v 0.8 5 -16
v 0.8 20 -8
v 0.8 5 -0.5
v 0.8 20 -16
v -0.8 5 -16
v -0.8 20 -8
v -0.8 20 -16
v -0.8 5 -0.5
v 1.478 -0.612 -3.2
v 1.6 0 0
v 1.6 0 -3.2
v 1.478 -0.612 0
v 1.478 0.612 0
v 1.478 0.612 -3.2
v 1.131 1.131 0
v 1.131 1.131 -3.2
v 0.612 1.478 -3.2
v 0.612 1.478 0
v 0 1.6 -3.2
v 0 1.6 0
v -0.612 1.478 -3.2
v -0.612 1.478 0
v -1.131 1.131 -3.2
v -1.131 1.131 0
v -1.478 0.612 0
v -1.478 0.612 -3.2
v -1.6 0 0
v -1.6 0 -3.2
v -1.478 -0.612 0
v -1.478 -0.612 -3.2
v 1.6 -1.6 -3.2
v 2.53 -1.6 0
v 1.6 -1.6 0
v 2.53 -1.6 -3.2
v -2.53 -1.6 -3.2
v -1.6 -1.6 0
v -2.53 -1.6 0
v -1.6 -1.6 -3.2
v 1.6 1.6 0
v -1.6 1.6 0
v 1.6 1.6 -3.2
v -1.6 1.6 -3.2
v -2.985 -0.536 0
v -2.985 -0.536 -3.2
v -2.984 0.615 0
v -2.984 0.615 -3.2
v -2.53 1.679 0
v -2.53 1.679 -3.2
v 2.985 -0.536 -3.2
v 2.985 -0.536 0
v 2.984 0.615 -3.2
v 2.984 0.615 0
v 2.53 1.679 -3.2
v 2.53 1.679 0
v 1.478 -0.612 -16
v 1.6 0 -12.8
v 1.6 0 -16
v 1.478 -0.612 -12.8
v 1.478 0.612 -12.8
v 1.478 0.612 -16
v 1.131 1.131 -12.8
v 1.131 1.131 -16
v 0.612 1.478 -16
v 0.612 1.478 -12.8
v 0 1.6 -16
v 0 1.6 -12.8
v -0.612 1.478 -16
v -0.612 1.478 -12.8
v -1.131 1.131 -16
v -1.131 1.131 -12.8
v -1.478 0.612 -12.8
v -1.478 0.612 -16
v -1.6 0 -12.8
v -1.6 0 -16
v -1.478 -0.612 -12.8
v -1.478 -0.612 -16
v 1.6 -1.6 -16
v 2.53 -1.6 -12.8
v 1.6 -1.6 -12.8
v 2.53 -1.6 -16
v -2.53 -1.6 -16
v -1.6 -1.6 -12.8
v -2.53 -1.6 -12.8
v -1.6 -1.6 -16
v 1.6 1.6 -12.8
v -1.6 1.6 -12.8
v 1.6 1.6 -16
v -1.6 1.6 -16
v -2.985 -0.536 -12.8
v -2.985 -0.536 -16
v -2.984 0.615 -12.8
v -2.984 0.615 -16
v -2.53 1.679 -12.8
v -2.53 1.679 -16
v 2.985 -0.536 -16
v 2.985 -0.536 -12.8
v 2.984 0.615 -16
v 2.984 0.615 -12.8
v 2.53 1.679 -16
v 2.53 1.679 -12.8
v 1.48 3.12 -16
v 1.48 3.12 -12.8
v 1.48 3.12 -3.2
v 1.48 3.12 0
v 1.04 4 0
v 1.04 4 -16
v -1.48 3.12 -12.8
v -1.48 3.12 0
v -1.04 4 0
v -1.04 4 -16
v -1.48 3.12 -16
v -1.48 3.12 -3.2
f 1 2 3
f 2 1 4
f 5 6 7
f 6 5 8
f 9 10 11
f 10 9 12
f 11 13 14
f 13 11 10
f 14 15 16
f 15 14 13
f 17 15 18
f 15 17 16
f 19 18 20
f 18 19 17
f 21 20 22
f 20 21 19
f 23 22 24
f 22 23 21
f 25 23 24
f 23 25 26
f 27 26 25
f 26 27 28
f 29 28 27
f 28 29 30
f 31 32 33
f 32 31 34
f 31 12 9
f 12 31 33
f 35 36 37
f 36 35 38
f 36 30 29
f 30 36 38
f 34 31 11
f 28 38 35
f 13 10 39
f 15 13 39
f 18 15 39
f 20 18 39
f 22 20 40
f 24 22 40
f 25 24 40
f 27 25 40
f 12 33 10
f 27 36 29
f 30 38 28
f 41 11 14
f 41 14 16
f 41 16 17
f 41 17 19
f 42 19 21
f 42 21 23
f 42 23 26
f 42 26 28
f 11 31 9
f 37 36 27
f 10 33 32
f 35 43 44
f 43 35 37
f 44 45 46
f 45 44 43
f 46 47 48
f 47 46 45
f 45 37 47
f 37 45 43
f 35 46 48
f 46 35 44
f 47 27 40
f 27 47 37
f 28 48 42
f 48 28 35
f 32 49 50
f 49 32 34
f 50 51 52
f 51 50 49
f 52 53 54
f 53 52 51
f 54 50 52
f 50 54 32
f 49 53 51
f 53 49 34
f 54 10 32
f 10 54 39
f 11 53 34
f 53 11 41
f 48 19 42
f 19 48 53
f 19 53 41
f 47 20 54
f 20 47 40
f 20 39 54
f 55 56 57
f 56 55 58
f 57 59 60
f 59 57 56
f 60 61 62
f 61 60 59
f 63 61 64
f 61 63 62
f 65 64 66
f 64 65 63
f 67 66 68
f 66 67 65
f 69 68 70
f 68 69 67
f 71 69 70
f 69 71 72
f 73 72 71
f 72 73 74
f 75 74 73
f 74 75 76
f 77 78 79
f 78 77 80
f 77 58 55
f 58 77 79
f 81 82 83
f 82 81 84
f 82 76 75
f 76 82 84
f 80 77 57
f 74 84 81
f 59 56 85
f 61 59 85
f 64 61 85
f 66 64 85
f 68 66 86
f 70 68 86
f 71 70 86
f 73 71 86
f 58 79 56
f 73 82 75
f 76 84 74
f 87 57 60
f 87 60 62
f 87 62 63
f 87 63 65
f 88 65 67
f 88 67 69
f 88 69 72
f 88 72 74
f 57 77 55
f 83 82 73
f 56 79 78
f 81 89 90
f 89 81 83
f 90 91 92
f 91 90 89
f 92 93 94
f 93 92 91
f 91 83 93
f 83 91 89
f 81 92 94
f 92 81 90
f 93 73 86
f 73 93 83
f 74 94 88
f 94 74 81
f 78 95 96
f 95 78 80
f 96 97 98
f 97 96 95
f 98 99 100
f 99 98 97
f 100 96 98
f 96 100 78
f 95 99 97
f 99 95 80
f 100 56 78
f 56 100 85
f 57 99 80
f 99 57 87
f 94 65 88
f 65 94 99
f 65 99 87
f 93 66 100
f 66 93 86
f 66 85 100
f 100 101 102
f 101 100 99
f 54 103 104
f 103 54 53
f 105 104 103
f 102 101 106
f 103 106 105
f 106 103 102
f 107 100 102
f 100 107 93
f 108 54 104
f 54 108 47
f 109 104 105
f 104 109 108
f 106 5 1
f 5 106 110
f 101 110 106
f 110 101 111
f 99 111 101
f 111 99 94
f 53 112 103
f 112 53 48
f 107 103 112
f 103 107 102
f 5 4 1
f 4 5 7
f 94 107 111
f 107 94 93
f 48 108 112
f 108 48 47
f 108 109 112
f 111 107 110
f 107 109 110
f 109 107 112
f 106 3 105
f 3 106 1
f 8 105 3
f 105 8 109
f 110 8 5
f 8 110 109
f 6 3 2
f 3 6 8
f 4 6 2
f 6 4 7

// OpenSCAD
// file: ../p/5-8edge.scad
use <../lib.scad>
function ldraw_lib__5_8edge() = [
// 0 Circle 0.625
// 0 Name: 5-8edge.dat
// 0 Author: Mark Kennedy [mkennedy]
// 0 !LDRAW_ORG Primitive UPDATE 2017-01
// 0 !LICENSE Licensed under CC BY 4.0 : see CAreadme.txt
// 
// 0 BFC CERTIFY CCW
  [0,"BFC","CERTIFY"],
  [0,"BFC","CCW"],
// 
// 0 !HISTORY 2004-04-22 [PTadmin] Official Update 2004-02
// 0 !HISTORY 2005-12-28 [PTadmin] Official Update 2005-01
// 0 !HISTORY 2007-06-24 [PTadmin] Header formatted for Contributor Agreement
// 0 !HISTORY 2008-07-01 [PTadmin] Official Update 2008-01
// 0 !HISTORY 2017-01-15 [Steffen] BFCed
// 0 !HISTORY 2017-12-30 [PTadmin] Official Update 2017-01
// 
// 
// 2 24 1 0 0 0.9239 0 0.3827
  [2,24,1,0,0,0.9239,0,0.3827],
// 2 24 0.9239 0 0.3827 0.7071 0 0.7071
  [2,24,0.9239,0,0.3827,0.7071,0,0.7071],
// 2 24 0.7071 0 0.7071 0.3827 0 0.9239
  [2,24,0.7071,0,0.7071,0.3827,0,0.9239],
// 2 24 0.3827 0 0.9239 0 0 1
  [2,24,0.3827,0,0.9239,0,0,1],
// 2 24 0 0 1 -0.3827 0 0.9239
  [2,24,0,0,1,-0.3827,0,0.9239],
// 2 24 -0.3827 0 0.9239 -0.7071 0 0.7071
  [2,24,-0.3827,0,0.9239,-0.7071,0,0.7071],
// 2 24 -0.7071 0 0.7071 -0.9239 0 0.3827
  [2,24,-0.7071,0,0.7071,-0.9239,0,0.3827],
// 2 24 -0.9239 0 0.3827 -1 0 0
  [2,24,-0.9239,0,0.3827,-1,0,0],
// 2 24 -1 0 0 -0.9239 0 -0.3827
  [2,24,-1,0,0,-0.9239,0,-0.3827],
// 2 24 -0.9239 0 -0.3827 -0.7071 0 -0.7071
  [2,24,-0.9239,0,-0.3827,-0.7071,0,-0.7071],
];
module ldraw_lib__5_8edge(step=0, col=false, unit=2/5, alt=false, line=0.2, solid=!$preview)
    makepoly(ldraw_lib__5_8edge(), step=step, col=col, unit=unit, alt=alt, line=line, solid=solid);
ldraw_lib__5_8edge(line=0.2);
// file: ../p/5-8cyli.scad
use <../lib.scad>
function ldraw_lib__5_8cyli() = [
// 0 Cylinder 0.625
// 0 Name: 5-8cyli.dat
// 0 Author: Mark Kennedy [mkennedy]
// 0 !LDRAW_ORG Primitive UPDATE 2005-01
// 0 !LICENSE Licensed under CC BY 4.0 : see CAreadme.txt
// 
// 0 BFC CERTIFY CCW
  [0,"BFC","CERTIFY"],
  [0,"BFC","CCW"],
// 
// 0 !HISTORY 2004-04-22 [PTadmin] Official Update 2004-02
// 0 !HISTORY 2004-12-11 [nielsk] Recreated using Primitive Generator, Edge lines fixed, BFC changed to CCW
// 0 !HISTORY 2005-12-28 [PTadmin] Official Update 2005-01
// 0 !HISTORY 2007-06-24 [PTadmin] Header formatted for Contributor Agreement
// 0 !HISTORY 2008-07-01 [PTadmin] Official Update 2008-01
// 
// 
// 4 16 .9239 1 .3827 .9239 0 .3827 1 0 0 1 1 0
  [4,16,.9239,1,.3827,.9239,0,.3827,1,0,0,1,1,0],
// 4 16 .7071 1 .7071 .7071 0 .7071 .9239 0 .3827 .9239 1 .3827
  [4,16,.7071,1,.7071,.7071,0,.7071,.9239,0,.3827,.9239,1,.3827],
// 4 16 .3827 1 .9239 .3827 0 .9239 .7071 0 .7071 .7071 1 .7071
  [4,16,.3827,1,.9239,.3827,0,.9239,.7071,0,.7071,.7071,1,.7071],
// 4 16 0 1 1 0 0 1 .3827 0 .9239 .3827 1 .9239
  [4,16,0,1,1,0,0,1,.3827,0,.9239,.3827,1,.9239],
// 4 16 -.3827 1 .9239 -.3827 0 .9239 0 0 1 0 1 1
  [4,16,-.3827,1,.9239,-.3827,0,.9239,0,0,1,0,1,1],
// 4 16 -.7071 1 .7071 -.7071 0 .7071 -.3827 0 .9239 -.3827 1 .9239
  [4,16,-.7071,1,.7071,-.7071,0,.7071,-.3827,0,.9239,-.3827,1,.9239],
// 4 16 -.9239 1 .3827 -.9239 0 .3827 -.7071 0 .7071 -.7071 1 .7071
  [4,16,-.9239,1,.3827,-.9239,0,.3827,-.7071,0,.7071,-.7071,1,.7071],
// 4 16 -1 1 0 -1 0 0 -.9239 0 .3827 -.9239 1 .3827
  [4,16,-1,1,0,-1,0,0,-.9239,0,.3827,-.9239,1,.3827],
// 4 16 -.9239 1 -.3827 -.9239 0 -.3827 -1 0 0 -1 1 0
  [4,16,-.9239,1,-.3827,-.9239,0,-.3827,-1,0,0,-1,1,0],
// 4 16 -.7071 1 -.7071 -.7071 0 -.7071 -.9239 0 -.3827 -.9239 1 -.3827
  [4,16,-.7071,1,-.7071,-.7071,0,-.7071,-.9239,0,-.3827,-.9239,1,-.3827],
// 0
// 5 24 1 1 0 1 0 0 1 1 -.4142 .9239 1 .3827
  [5,24,1,1,0,1,0,0,1,1,-.4142,.9239,1,.3827],
// 5 24 .9239 1 .3827 .9239 0 .3827 1 1 0 .7071 1 .7071
  [5,24,.9239,1,.3827,.9239,0,.3827,1,1,0,.7071,1,.7071],
// 5 24 .7071 1 .7071 .7071 0 .7071 .9239 1 .3827 .3827 1 .9239
  [5,24,.7071,1,.7071,.7071,0,.7071,.9239,1,.3827,.3827,1,.9239],
// 5 24 .3827 1 .9239 .3827 0 .9239 .7071 1 .7071 0 1 1
  [5,24,.3827,1,.9239,.3827,0,.9239,.7071,1,.7071,0,1,1],
// 5 24 0 1 1 0 0 1 .3827 1 .9239 -.3827 1 .9239
  [5,24,0,1,1,0,0,1,.3827,1,.9239,-.3827,1,.9239],
// 5 24 -.3827 1 .9239 -.3827 0 .9239 0 1 1 -.7071 1 .7071
  [5,24,-.3827,1,.9239,-.3827,0,.9239,0,1,1,-.7071,1,.7071],
// 5 24 -.7071 1 .7071 -.7071 0 .7071 -.3827 1 .9239 -.9239 1 .3827
  [5,24,-.7071,1,.7071,-.7071,0,.7071,-.3827,1,.9239,-.9239,1,.3827],
// 5 24 -.9239 1 .3827 -.9239 0 .3827 -.7071 1 .7071 -1 1 0
  [5,24,-.9239,1,.3827,-.9239,0,.3827,-.7071,1,.7071,-1,1,0],
// 5 24 -1 1 0 -1 0 0 -.9239 1 .3827 -.9239 1 -.3827
  [5,24,-1,1,0,-1,0,0,-.9239,1,.3827,-.9239,1,-.3827],
// 5 24 -.9239 1 -.3827 -.9239 0 -.3827 -1 1 0 -.7071 1 -.7071
  [5,24,-.9239,1,-.3827,-.9239,0,-.3827,-1,1,0,-.7071,1,-.7071],
// 5 24 -.7071 1 -.7071 -.7071 0 -.7071 -.9239 1 -.3827 -.4142 1 -1
  [5,24,-.7071,1,-.7071,-.7071,0,-.7071,-.9239,1,-.3827,-.4142,1,-1],
// 0
];
module ldraw_lib__5_8cyli(step=0, col=false, unit=2/5, alt=false, line=0.2, solid=!$preview)
    makepoly(ldraw_lib__5_8cyli(), step=step, col=col, unit=unit, alt=alt, line=line, solid=solid);
ldraw_lib__5_8cyli(line=0.2);
// file: ../p/3-16edge.scad
use <../lib.scad>
function ldraw_lib__3_16edge() = [
// 0 Circle 0.1875
// 0 Name: 3-16edge.dat
// 0 Author: Donald Sutter [technog]
// 0 !LDRAW_ORG Primitive UPDATE 2017-01
// 0 !LICENSE Licensed under CC BY 4.0 : see CAreadme.txt
// 
// 0 BFC CERTIFY CCW
  [0,"BFC","CERTIFY"],
  [0,"BFC","CCW"],
// 
// 0 !HISTORY 2004-03-02 [PTadmin] Official Update 2004-01
// 0 !HISTORY 2007-06-24 [PTadmin] Header formatted for Contributor Agreement
// 0 !HISTORY 2008-07-01 [PTadmin] Official Update 2008-01
// 0 !HISTORY 2017-01-15 [Steffen] BFCed
// 0 !HISTORY 2017-12-30 [PTadmin] Official Update 2017-01
// 
// 
// 2 24 1 0 0 0.9239 0 0.3827
  [2,24,1,0,0,0.9239,0,0.3827],
// 2 24 0.9239 0 0.3827 0.7071 0 0.7071
  [2,24,0.9239,0,0.3827,0.7071,0,0.7071],
// 2 24 0.7071 0 0.7071 0.3827 0 0.9239
  [2,24,0.7071,0,0.7071,0.3827,0,0.9239],
];
module ldraw_lib__3_16edge(step=0, col=false, unit=2/5, alt=false, line=0.2, solid=!$preview)
    makepoly(ldraw_lib__3_16edge(), step=step, col=col, unit=unit, alt=alt, line=line, solid=solid);
ldraw_lib__3_16edge(line=0.2);
// file: ../p/3-16cyli.scad
use <../lib.scad>
function ldraw_lib__3_16cyli() = [
// 0 Cylinder 0.1875
// 0 Name: 3-16cyli.dat
// 0 Author: Mark Kennedy [mkennedy]
// 0 !LDRAW_ORG Primitive UPDATE 2005-01
// 0 !LICENSE Licensed under CC BY 4.0 : see CAreadme.txt
// 
// 0 BFC CERTIFY CCW
  [0,"BFC","CERTIFY"],
  [0,"BFC","CCW"],
// 
// 0 !HISTORY 2004-03-02 [PTadmin] Official Update 2004-01
// 0 !HISTORY 2004-12-11 [nielsk] Recreated using Primitive Generator, Edge lines fixed, BFC changed to CCW
// 0 !HISTORY 2005-12-28 [PTadmin] Official Update 2005-01
// 0 !HISTORY 2007-06-24 [PTadmin] Header formatted for Contributor Agreement
// 0 !HISTORY 2008-07-01 [PTadmin] Official Update 2008-01
// 
// 
// 4 16 .9239 1 .3827 .9239 0 .3827 1 0 0 1 1 0
  [4,16,.9239,1,.3827,.9239,0,.3827,1,0,0,1,1,0],
// 4 16 .7071 1 .7071 .7071 0 .7071 .9239 0 .3827 .9239 1 .3827
  [4,16,.7071,1,.7071,.7071,0,.7071,.9239,0,.3827,.9239,1,.3827],
// 4 16 .3827 1 .9239 .3827 0 .9239 .7071 0 .7071 .7071 1 .7071
  [4,16,.3827,1,.9239,.3827,0,.9239,.7071,0,.7071,.7071,1,.7071],
// 5 24 1 1 0 1 0 0 1 1 -.4142 .9239 1 .3827
  [5,24,1,1,0,1,0,0,1,1,-.4142,.9239,1,.3827],
// 5 24 .9239 1 .3827 .9239 0 .3827 1 1 0 .7071 1 .7071
  [5,24,.9239,1,.3827,.9239,0,.3827,1,1,0,.7071,1,.7071],
// 5 24 .7071 1 .7071 .7071 0 .7071 .9239 1 .3827 .3827 1 .9239
  [5,24,.7071,1,.7071,.7071,0,.7071,.9239,1,.3827,.3827,1,.9239],
// 5 24 .3827 1 .9239 .3827 0 .9239 .7071 1 .7071 0 1 1.0824
  [5,24,.3827,1,.9239,.3827,0,.9239,.7071,1,.7071,0,1,1.0824],
// 0
];
module ldraw_lib__3_16cyli(step=0, col=false, unit=2/5, alt=false, line=0.2, solid=!$preview)
    makepoly(ldraw_lib__3_16cyli(), step=step, col=col, unit=unit, alt=alt, line=line, solid=solid);
ldraw_lib__3_16cyli(line=0.2);
// file: ../p/box2-5.scad
use <../lib.scad>
function ldraw_lib__box2_5() = [
// 0 Box with 2 Faces without 5 Edges
// 0 Name: box2-5.dat
// 0 Author: Steffen [Steffen]
// 0 !LDRAW_ORG Primitive UPDATE 2003-03
// 0 !LICENSE Licensed under CC BY 4.0 : see CAreadme.txt
// 
// 0 BFC CERTIFY CCW
  [0,"BFC","CERTIFY"],
  [0,"BFC","CCW"],
// 
// 0 !HISTORY 2003-12-19 [PTadmin] Official Update 2003-03
// 0 !HISTORY 2007-06-24 [PTadmin] Header formatted for Contributor Agreement
// 0 !HISTORY 2008-07-01 [PTadmin] Official Update 2008-01
// 
// 
// 2 24 1 1 1 -1 1 1
  [2,24,1,1,1,-1,1,1],
// 2 24 1 1 -1 -1 1 -1
  [2,24,1,1,-1,-1,1,-1],
// 2 24 1 -1 1 -1 -1 1
  [2,24,1,-1,1,-1,-1,1],
// 2 24 -1 -1 1 -1 1 1
  [2,24,-1,-1,1,-1,1,1],
// 2 24 1 -1 1 1 1 1
  [2,24,1,-1,1,1,1,1],
// 2 24 -1 1 -1 -1 1 1
  [2,24,-1,1,-1,-1,1,1],
// 2 24 1 1 -1 1 1 1
  [2,24,1,1,-1,1,1,1],
// 4 16 1 1 1 1 1 -1 -1 1 -1 -1 1 1
  [4,16,1,1,1,1,1,-1,-1,1,-1,-1,1,1],
// 4 16 1 1 1 -1 1 1 -1 -1 1 1 -1 1
  [4,16,1,1,1,-1,1,1,-1,-1,1,1,-1,1],
// 0
];
module ldraw_lib__box2_5(step=0, col=false, unit=2/5, alt=false, line=0.2, solid=!$preview)
    makepoly(ldraw_lib__box2_5(), step=step, col=col, unit=unit, alt=alt, line=line, solid=solid);
ldraw_lib__box2_5(line=0.2);
// file: ../p/5-8cylo.scad
use <../lib.scad>
use <5-8cyli.scad>
use <5-8edge.scad>
function ldraw_lib__5_8cylo() = [
// 0 Cylinder Open 0.625
// 0 Name: 5-8cylo.dat
// 0 Author: J.C. Tchang [tchang]
// 0 !LDRAW_ORG Primitive UPDATE 2013-01
// 0 !LICENSE Licensed under CC BY 4.0 : see CAreadme.txt
// 
// 0 BFC CERTIFY CCW
  [0,"BFC","CERTIFY"],
  [0,"BFC","CCW"],
// 
// 0 !HISTORY 2013-07-21 [PTadmin] Official Update 2013-01
// 
// 
// 1 16 0 0 0 1 0 0 0 1 0 0 0 1 5-8edge.dat
  [1,16,0,0,0,1,0,0,0,1,0,0,0,1, ldraw_lib__5_8edge()],
// 1 16 0 1 0 1 0 0 0 1 0 0 0 1 5-8edge.dat
  [1,16,0,1,0,1,0,0,0,1,0,0,0,1, ldraw_lib__5_8edge()],
// 1 16 0 0 0 1 0 0 0 1 0 0 0 1 5-8cyli.dat
  [1,16,0,0,0,1,0,0,0,1,0,0,0,1, ldraw_lib__5_8cyli()],
];
module ldraw_lib__5_8cylo(step=0, col=false, unit=2/5, alt=false, line=0.2, solid=!$preview)
    makepoly(ldraw_lib__5_8cylo(), step=step, col=col, unit=unit, alt=alt, line=line, solid=solid);
ldraw_lib__5_8cylo(line=0.2);
// file: ../p/3-16cylo.scad
use <../lib.scad>
use <3-16cyli.scad>
use <3-16edge.scad>
function ldraw_lib__3_16cylo() = [
// 0 Cylinder Open 0.1875
// 0 Name: 3-16cylo.dat
// 0 Author: J.C. Tchang [tchang]
// 0 !LDRAW_ORG Primitive UPDATE 2013-01
// 0 !LICENSE Licensed under CC BY 4.0 : see CAreadme.txt
// 
// 0 BFC CERTIFY CCW
  [0,"BFC","CERTIFY"],
  [0,"BFC","CCW"],
// 
// 0 !HISTORY 2013-07-21 [PTadmin] Official Update 2013-01
// 
// 
// 1 16 0 0 0 1 0 0 0 1 0 0 0 1 3-16edge.dat
  [1,16,0,0,0,1,0,0,0,1,0,0,0,1, ldraw_lib__3_16edge()],
// 1 16 0 1 0 1 0 0 0 1 0 0 0 1 3-16edge.dat
  [1,16,0,1,0,1,0,0,0,1,0,0,0,1, ldraw_lib__3_16edge()],
// 1 16 0 0 0 1 0 0 0 1 0 0 0 1 3-16cyli.dat
  [1,16,0,0,0,1,0,0,0,1,0,0,0,1, ldraw_lib__3_16cyli()],
];
module ldraw_lib__3_16cylo(step=0, col=false, unit=2/5, alt=false, line=0.2, solid=!$preview)
    makepoly(ldraw_lib__3_16cylo(), step=step, col=col, unit=unit, alt=alt, line=line, solid=solid);
ldraw_lib__3_16cylo(line=0.2);
// file: ../p/3-16chrd.scad
use <../lib.scad>
function ldraw_lib__3_16chrd() = [
// 0 Chord 0.1875
// 0 Name: 3-16chrd.dat
// 0 Author: Niels Karsdorp [nielsk]
// 0 !LDRAW_ORG Primitive UPDATE 2009-01
// 0 !LICENSE Licensed under CC BY 4.0 : see CAreadme.txt
// 
// 0 BFC CERTIFY CCW
  [0,"BFC","CERTIFY"],
  [0,"BFC","CCW"],
// 
// 0 !HISTORY 2009-05-02 [PTadmin] Official Update 2009-01
// 
// 
// 4 16 1 0 0 0.9239 0 0.3827 0.7071 0 0.7071 0.3827 0 0.9239
  [4,16,1,0,0,0.9239,0,0.3827,0.7071,0,0.7071,0.3827,0,0.9239],
// 0
// 
];
module ldraw_lib__3_16chrd(step=0, col=false, unit=2/5, alt=false, line=0.2, solid=!$preview)
    makepoly(ldraw_lib__3_16chrd(), step=step, col=col, unit=unit, alt=alt, line=line, solid=solid);
ldraw_lib__3_16chrd(line=0.2);
// file: ../p/2-4ndis.scad
use <../lib.scad>
function ldraw_lib__2_4ndis() = [
// 0 Disc Negative 0.5
// 0 Name: 2-4ndis.dat
// 0 Author: James Jessiman
// 0 !LDRAW_ORG Primitive UPDATE 2012-01
// 0 !LICENSE Licensed under CC BY 4.0 : see CAreadme.txt
// 
// 0 BFC CERTIFY CCW
  [0,"BFC","CERTIFY"],
  [0,"BFC","CCW"],
// 
// 0 !HISTORY 2002-03-23 [sbliss] Added BFC statement; compacted code
// 0 !HISTORY 2002-04-25 [PTadmin] Official Update 2002-02
// 0 !HISTORY 2007-06-24 [PTadmin] Header formatted for Contributor Agreement
// 0 !HISTORY 2008-07-01 [PTadmin] Official Update 2008-01
// 0 !HISTORY 2012-02-16 [Philo] Changed to CCW
// 0 !HISTORY 2012-03-30 [PTadmin] Official Update 2012-01
// 
// 
// 3 16 0.9239 0 0.3827 1 0 0 1 0 1
  [3,16,0.9239,0,0.3827,1,0,0,1,0,1],
// 3 16 0.7071 0 0.7071 0.9239 0 0.3827 1 0 1
  [3,16,0.7071,0,0.7071,0.9239,0,0.3827,1,0,1],
// 3 16 0.3827 0 0.9239 0.7071 0 0.7071 1 0 1
  [3,16,0.3827,0,0.9239,0.7071,0,0.7071,1,0,1],
// 3 16 0 0 1 0.3827 0 0.9239 1 0 1
  [3,16,0,0,1,0.3827,0,0.9239,1,0,1],
// 3 16 -0.3827 0 0.9239 0 0 1 -1 0 1
  [3,16,-0.3827,0,0.9239,0,0,1,-1,0,1],
// 3 16 -0.7071 0 0.7071 -0.3827 0 0.9239 -1 0 1
  [3,16,-0.7071,0,0.7071,-0.3827,0,0.9239,-1,0,1],
// 3 16 -0.9239 0 0.3827 -0.7071 0 0.7071 -1 0 1
  [3,16,-0.9239,0,0.3827,-0.7071,0,0.7071,-1,0,1],
// 3 16 -1 0 0 -0.9239 0 0.3827 -1 0 1
  [3,16,-1,0,0,-0.9239,0,0.3827,-1,0,1],
];
module ldraw_lib__2_4ndis(step=0, col=false, unit=2/5, alt=false, line=0.2, solid=!$preview)
    makepoly(ldraw_lib__2_4ndis(), step=step, col=col, unit=unit, alt=alt, line=line, solid=solid);
ldraw_lib__2_4ndis(line=0.2);
// file: ../p/1-16ndis.scad
use <../lib.scad>
function ldraw_lib__1_16ndis() = [
// 0 Disc Negative 0.0625
// 0 Name: 1-16ndis.dat
// 0 Author: Niels Karsdorp [nielsk]
// 0 !LDRAW_ORG Primitive UPDATE 2009-01
// 0 !LICENSE Licensed under CC BY 4.0 : see CAreadme.txt
// 
// 0 BFC CERTIFY CCW
  [0,"BFC","CERTIFY"],
  [0,"BFC","CCW"],
// 
// 0 !HISTORY 2009-05-02 [PTadmin] Official Update 2009-01
// 
// 
// 3 16 1 0 0 1 0 1 0.9239 0 0.3827
  [3,16,1,0,0,1,0,1,0.9239,0,0.3827],
// 0
];
module ldraw_lib__1_16ndis(step=0, col=false, unit=2/5, alt=false, line=0.2, solid=!$preview)
    makepoly(ldraw_lib__1_16ndis(), step=step, col=col, unit=unit, alt=alt, line=line, solid=solid);
ldraw_lib__1_16ndis(line=0.2);
// file: ../p/rect2p.scad
use <../lib.scad>
function ldraw_lib__rect2p() = [
// 0 Rectangle with 2 Parallel Edges
// 0 Name: rect2p.dat
// 0 Author: Donald Sutter [technog]
// 0 !LDRAW_ORG Primitive UPDATE 2010-01
// 0 !LICENSE Licensed under CC BY 4.0 : see CAreadme.txt
// 
// 0 BFC CERTIFY CCW
  [0,"BFC","CERTIFY"],
  [0,"BFC","CCW"],
// 
// 0 !HISTORY 2003-08-01 [PTadmin] Official Update 2003-02
// 0 !HISTORY 2007-06-24 [PTadmin] Header formatted for Contributor Agreement
// 0 !HISTORY 2008-07-01 [PTadmin] Official Update 2008-01
// 0 !HISTORY 2010-01-17 [mikeheide] changed winding to CCW
// 0 !HISTORY 2010-04-05 [PTadmin] Official Update 2010-01
// 
// 
// 2 24 1 0 1 -1 0 1
  [2,24,1,0,1,-1,0,1],
// 2 24 -1 0 -1 1 0 -1
  [2,24,-1,0,-1,1,0,-1],
// 4 16 -1 0 1 -1 0 -1 1 0 -1 1 0 1
  [4,16,-1,0,1,-1,0,-1,1,0,-1,1,0,1],
// 0
];
module ldraw_lib__rect2p(step=0, col=false, unit=2/5, alt=false, line=0.2, solid=!$preview)
    makepoly(ldraw_lib__rect2p(), step=step, col=col, unit=unit, alt=alt, line=line, solid=solid);
ldraw_lib__rect2p(line=0.2);
// file: ../p/rect.scad
use <../lib.scad>
function ldraw_lib__rect() = [
// 0 Rectangle
// 0 Name: rect.dat
// 0 Author: James Jessiman
// 0 !LDRAW_ORG Primitive UPDATE 2010-01
// 0 !LICENSE Licensed under CC BY 4.0 : see CAreadme.txt
// 
// 0 BFC CERTIFY CCW
  [0,"BFC","CERTIFY"],
  [0,"BFC","CCW"],
// 
// 0 !HISTORY 2002-04-05 [hafhead] Added BFC statement
// 0 !HISTORY 2002-04-25 [PTadmin] Official Update 2002-02
// 0 !HISTORY 2007-06-24 [PTadmin] Header formatted for Contributor Agreement
// 0 !HISTORY 2008-07-01 [PTadmin] Official Update 2008-01
// 0 !HISTORY 2010-01-17 [mikeheide] changed winding to CCW
// 0 !HISTORY 2010-04-05 [PTadmin] Official Update 2010-01
// 
// 
// 2 24 1 0 1 -1 0 1
  [2,24,1,0,1,-1,0,1],
// 2 24 -1 0 1 -1 0 -1
  [2,24,-1,0,1,-1,0,-1],
// 2 24 -1 0 -1 1 0 -1
  [2,24,-1,0,-1,1,0,-1],
// 2 24 1 0 -1 1 0 1
  [2,24,1,0,-1,1,0,1],
// 4 16 -1 0 1 -1 0 -1 1 0 -1 1 0 1
  [4,16,-1,0,1,-1,0,-1,1,0,-1,1,0,1],
// 0
];
module ldraw_lib__rect(step=0, col=false, unit=2/5, alt=false, line=0.2, solid=!$preview)
    makepoly(ldraw_lib__rect(), step=step, col=col, unit=unit, alt=alt, line=line, solid=solid);
ldraw_lib__rect(line=0.2);
// file: ../p/clip13.scad
use <../lib.scad>
use <1-16ndis.scad>
use <2-4ndis.scad>
use <3-16chrd.scad>
use <3-16cylo.scad>
use <5-8cylo.scad>
use <box2-5.scad>
function ldraw_lib__clip13() = [
// 0 Clip Minimal (Thick C-Clip)
// 0 Name: clip13.dat
// 0 Author: Philippe Hurbain [Philo]
// 0 !LDRAW_ORG Primitive UPDATE 2017-01
// 0 !LICENSE Licensed under CC BY 4.0 : see CAreadme.txt
// 
// 0 BFC CERTIFY CCW
  [0,"BFC","CERTIFY"],
  [0,"BFC","CCW"],
// 
// 0 !HISTORY 2017-12-30 [PTadmin] Official Update 2017-01
// 
// 
// 0 BFC INVERTNEXT
  [0,"BFC","INVERTNEXT"],
// 1 16 0 4 0 3.69552 0 1.53073 0 -8 0 -1.53073 0 3.69552 5-8cylo.dat
  [1,16,0,4,0,3.69552,0,1.53073,0,-8,0,-1.53073,0,3.69552, ldraw_lib__5_8cylo()],
// 1 16 5.011 0 -2.765 0 0.1522 -1.16272 4 0 0 0 -1.2346 0 box2-5.dat
  [1,16,5.011,0,-2.765,0,0.1522,-1.16272,4,0,0,0,-1.2346,0, ldraw_lib__box2_5()],
// 1 16 -5.011 0 -2.765 0 -0.1522 1.16272 -4 0 0 0 -1.2346 0 box2-5.dat
  [1,16,-5.011,0,-2.765,0,-0.1522,1.16272,-4,0,0,0,-1.2346,0, ldraw_lib__box2_5()],
// 3 16 6.3254 4 -4 4 4 -4 4 4 0
  [3,16,6.3254,4,-4,4,4,-4,4,4,0],
// 3 16 -4 4 0 -4 4 -4 -6.3254 4 -4
  [3,16,-4,4,0,-4,4,-4,-6.3254,4,-4],
// 1 16 0 -4 0 4 0 0 0 1 0 0 0 4 2-4ndis.dat
  [1,16,0,-4,0,4,0,0,0,1,0,0,0,4, ldraw_lib__2_4ndis()],
// 1 16 0 -4 0 4 0 0 0 1 0 0 0 -4 1-16ndis.dat
  [1,16,0,-4,0,4,0,0,0,1,0,0,0,-4, ldraw_lib__1_16ndis()],
// 1 16 0 -4 0 -4 0 0 0 1 0 0 0 -4 1-16ndis.dat
  [1,16,0,-4,0,-4,0,0,0,1,0,0,0,-4, ldraw_lib__1_16ndis()],
// 1 16 0 4 0 -4 0 0 0 -1 0 0 0 -4 1-16ndis.dat
  [1,16,0,4,0,-4,0,0,0,-1,0,0,0,-4, ldraw_lib__1_16ndis()],
// 1 16 0 4 0 4 0 0 0 -1 0 0 0 4 2-4ndis.dat
  [1,16,0,4,0,4,0,0,0,-1,0,0,0,4, ldraw_lib__2_4ndis()],
// 1 16 0 4 0 4 0 0 0 -1 0 0 0 -4 1-16ndis.dat
  [1,16,0,4,0,4,0,0,0,-1,0,0,0,-4, ldraw_lib__1_16ndis()],
// 3 16 -6.3254 -4 -4 -4 -4 -4 -4 -4 0
  [3,16,-6.3254,-4,-4,-4,-4,-4,-4,-4,0],
// 3 16 4 -4 0 4 -4 -4 6.3254 -4 -4
  [3,16,4,-4,0,4,-4,-4,6.3254,-4,-4],
// 1 16 0 -4 0.098 -6.3254 0 -4.2265 0 8 0 -4.09842 0 6.13371 3-16cylo.dat
  [1,16,0,-4,0.098,-6.3254,0,-4.2265,0,8,0,-4.09842,0,6.13371, ldraw_lib__3_16cylo()],
// 1 16 0 -4 0.098 -6.3254 0 -4.2265 0 1 0 -4.09842 0 6.13371 3-16chrd.dat
  [1,16,0,-4,0.098,-6.3254,0,-4.2265,0,1,0,-4.09842,0,6.13371, ldraw_lib__3_16chrd()],
// 1 16 0 4 0.098 -6.3254 0 -4.2265 0 -1 0 -4.09842 0 6.13371 3-16chrd.dat
  [1,16,0,4,0.098,-6.3254,0,-4.2265,0,-1,0,-4.09842,0,6.13371, ldraw_lib__3_16chrd()],
// 4 16 -6.3259 -4 -3.9996 -4.0001 -4 0 -4 -4 4 -6.3256 -4 4.1965
  [4,16,-6.3259,-4,-3.9996,-4.0001,-4,0,-4,-4,4,-6.3256,-4,4.1965],
// 4 16 -6.3259 4 -3.9996 -6.3256 4 4.1965 -4 4 4 -4.0001 4 0
  [4,16,-6.3259,4,-3.9996,-6.3256,4,4.1965,-4,4,4,-4.0001,4,0],
// 1 16 0 -4 0.098 6.3254 0 4.2265 0 8 0 -4.09842 0 6.13371 3-16cylo.dat
  [1,16,0,-4,0.098,6.3254,0,4.2265,0,8,0,-4.09842,0,6.13371, ldraw_lib__3_16cylo()],
// 1 16 0 -4 0.098 6.3254 0 4.2265 0 1 0 -4.09842 0 6.13371 3-16chrd.dat
  [1,16,0,-4,0.098,6.3254,0,4.2265,0,1,0,-4.09842,0,6.13371, ldraw_lib__3_16chrd()],
// 1 16 0 4 0.098 6.3254 0 4.2265 0 -1 0 -4.09842 0 6.13371 3-16chrd.dat
  [1,16,0,4,0.098,6.3254,0,4.2265,0,-1,0,-4.09842,0,6.13371, ldraw_lib__3_16chrd()],
// 4 16 4 -4 4 4.0001 -4 0 6.3259 -4 -3.9996 6.3256 -4 4.1965
  [4,16,4,-4,4,4.0001,-4,0,6.3259,-4,-3.9996,6.3256,-4,4.1965],
// 4 16 4 4 4 6.3256 4 4.1965 6.3259 4 -3.9996 4.0001 4 0
  [4,16,4,4,4,6.3256,4,4.1965,6.3259,4,-3.9996,4.0001,4,0],
// 4 16 0 4 4.0001 -4 4 4 -6.3256 4 4.1965 6.3256 4 4.1965
  [4,16,0,4,4.0001,-4,4,4,-6.3256,4,4.1965,6.3256,4,4.1965],
// 3 16 0 4 4.0001 6.3256 4 4.1965 4 4 4
  [3,16,0,4,4.0001,6.3256,4,4.1965,4,4,4],
// 4 16 -6.3256 -4 4.1965 -4 -4 4 0 -4 4.0001 6.3256 -4 4.1965
  [4,16,-6.3256,-4,4.1965,-4,-4,4,0,-4,4.0001,6.3256,-4,4.1965],
// 3 16 0 -4 4.0001 4 -4 4 6.3256 -4 4.1965
  [3,16,0,-4,4.0001,4,-4,4,6.3256,-4,4.1965],
];
module ldraw_lib__clip13(step=0, col=false, unit=2/5, alt=false, line=0.2, solid=!$preview)
    makepoly(ldraw_lib__clip13(), step=step, col=col, unit=unit, alt=alt, line=line, solid=solid);
ldraw_lib__clip13(line=0.2);
// file: s/80324s02.scad
use <../../lib.scad>
use <../../p/clip13.scad>
use <../../p/rect.scad>
use <../../p/rect2p.scad>
function ldraw_lib__s__80324s02() = [
// 0 ~Flag  2 x  2 - Clips and bottom side
// 0 Name: s\80324s02.dat
// 0 Author: Vincent Messenet [Cheenzo]
// 0 !LDRAW_ORG Subpart UPDATE 2024-03
// 0 !LICENSE Licensed under CC BY 4.0 : see CAreadme.txt
// 
// 0 BFC CERTIFY CCW
  [0,"BFC","CERTIFY"],
  [0,"BFC","CCW"],
// 
// 0 !HISTORY 2024-04-28 [OrionP] Official Update 2024-03
// 
// 
// 1 16 0 4 0 1 0 0 0 1 0 0 0 1 clip13.dat
  [1,16,0,4,0,1,0,0,0,1,0,0,0,1, ldraw_lib__clip13()],
// 1 16 0 36 0 1 0 0 0 1 0 0 0 1 clip13.dat
  [1,16,0,36,0,1,0,0,0,1,0,0,0,1, ldraw_lib__clip13()],
// 2 24 3.7 40 7.8 2.6 40 10
  [2,24,3.7,40,7.8,2.6,40,10],
// 2 24 2.6 40 10 2 40 12.5
  [2,24,2.6,40,10,2,40,12.5],
// 2 24 6.3256 40 4.1965 3.7 40 7.8
  [2,24,6.3256,40,4.1965,3.7,40,7.8],
// 2 24 6.3256 32 4.1965 3.7 32 7.8
  [2,24,6.3256,32,4.1965,3.7,32,7.8],
// 2 24 6.3256 8 4.1965 3.7 8 7.8
  [2,24,6.3256,8,4.1965,3.7,8,7.8],
// 2 24 6.3256 0 4.1965 3.7 0 7.8
  [2,24,6.3256,0,4.1965,3.7,0,7.8],
// 4 16 3.7 32 7.8 6.3256 32 4.1965 6.3256 40 4.1965 3.7 40 7.8
  [4,16,3.7,32,7.8,6.3256,32,4.1965,6.3256,40,4.1965,3.7,40,7.8],
// 4 16 3.7 0 7.8 6.3256 0 4.1965 6.3256 8 4.1965 3.7 8 7.8
  [4,16,3.7,0,7.8,6.3256,0,4.1965,6.3256,8,4.1965,3.7,8,7.8],
// 3 16 2.6 0 10 3.7 0 7.8 3.7 8 7.8
  [3,16,2.6,0,10,3.7,0,7.8,3.7,8,7.8],
// 3 16 3.7 32 7.8 3.7 40 7.8 2.6 40 10
  [3,16,3.7,32,7.8,3.7,40,7.8,2.6,40,10],
// 2 24 2.6 0 10 3.7 0 7.8
  [2,24,2.6,0,10,3.7,0,7.8],
// 4 16 3.7 8 7.8 3.7 32 7.8 2.6 40 10 2.6 0 10
  [4,16,3.7,8,7.8,3.7,32,7.8,2.6,40,10,2.6,0,10],
// 4 16 -3.7 32 7.8 -6.3256 32 4.1965 6.3256 32 4.1965 3.7 32 7.8
  [4,16,-3.7,32,7.8,-6.3256,32,4.1965,6.3256,32,4.1965,3.7,32,7.8],
// 4 16 6.3256 0 4.1965 3.7 0 7.8 -3.7 0 7.8 -6.3256 0 4.1965
  [4,16,6.3256,0,4.1965,3.7,0,7.8,-3.7,0,7.8,-6.3256,0,4.1965],
// 4 16 3.7 0 7.8 2.6 0 10 -2.6 0 10 -3.7 0 7.8
  [4,16,3.7,0,7.8,2.6,0,10,-2.6,0,10,-3.7,0,7.8],
// 4 16 2 40 12.5 2.6 40 10 -2.6 40 10 -2 40 12.5
  [4,16,2,40,12.5,2.6,40,10,-2.6,40,10,-2,40,12.5],
// 4 16 2.6 40 10 3.7 40 7.8 -3.7 40 7.8 -2.6 40 10
  [4,16,2.6,40,10,3.7,40,7.8,-3.7,40,7.8,-2.6,40,10],
// 4 16 3.7 40 7.8 6.3256 40 4.1965 -6.3256 40 4.1965 -3.7 40 7.8
  [4,16,3.7,40,7.8,6.3256,40,4.1965,-6.3256,40,4.1965,-3.7,40,7.8],
// 4 16 6.3256 8 4.1965 -6.3256 8 4.1965 -3.7 8 7.8 3.7 8 7.8
  [4,16,6.3256,8,4.1965,-6.3256,8,4.1965,-3.7,8,7.8,3.7,8,7.8],
// 1 16 0 20 7.8 -3.7 0 0 0 0 12 0 1 0 rect.dat
  [1,16,0,20,7.8,-3.7,0,0,0,0,12,0,1,0, ldraw_lib__rect()],
// 1 16 0 40 31.25 0 0 -2 0 -1 0 -18.75 0 0 rect2p.dat
  [1,16,0,40,31.25,0,0,-2,0,-1,0,-18.75,0,0, ldraw_lib__rect2p()],
// 2 24 -3.7 40 7.8 -2.6 40 10
  [2,24,-3.7,40,7.8,-2.6,40,10],
// 2 24 -2.6 40 10 -2 40 12.5
  [2,24,-2.6,40,10,-2,40,12.5],
// 2 24 -6.3256 40 4.1965 -3.7 40 7.8
  [2,24,-6.3256,40,4.1965,-3.7,40,7.8],
// 2 24 -6.3256 32 4.1965 -3.7 32 7.8
  [2,24,-6.3256,32,4.1965,-3.7,32,7.8],
// 2 24 -6.3256 8 4.1965 -3.7 8 7.8
  [2,24,-6.3256,8,4.1965,-3.7,8,7.8],
// 2 24 -6.3256 0 4.1965 -3.7 0 7.8
  [2,24,-6.3256,0,4.1965,-3.7,0,7.8],
// 2 24 -2.6 0 10 -3.7 0 7.8
  [2,24,-2.6,0,10,-3.7,0,7.8],
// 4 16 -6.3256 40 4.1965 -6.3256 32 4.1965 -3.7 32 7.8 -3.7 40 7.8
  [4,16,-6.3256,40,4.1965,-6.3256,32,4.1965,-3.7,32,7.8,-3.7,40,7.8],
// 4 16 -6.3256 8 4.1965 -6.3256 0 4.1965 -3.7 0 7.8 -3.7 8 7.8
  [4,16,-6.3256,8,4.1965,-6.3256,0,4.1965,-3.7,0,7.8,-3.7,8,7.8],
// 3 16 -3.7 0 7.8 -2.6 0 10 -3.7 8 7.8
  [3,16,-3.7,0,7.8,-2.6,0,10,-3.7,8,7.8],
// 3 16 -3.7 40 7.8 -3.7 32 7.8 -2.6 40 10
  [3,16,-3.7,40,7.8,-3.7,32,7.8,-2.6,40,10],
// 4 16 -2.6 40 10 -3.7 32 7.8 -3.7 8 7.8 -2.6 0 10
  [4,16,-2.6,40,10,-3.7,32,7.8,-3.7,8,7.8,-2.6,0,10],
// 5 24 3.7 32 7.8 3.7 40 7.8 2.6 40 10 6.3256 32 4.1965
  [5,24,3.7,32,7.8,3.7,40,7.8,2.6,40,10,6.3256,32,4.1965],
// 5 24 2.6 40 10 2.6 0 10 3.7 8 7.8 2 40 12.5
  [5,24,2.6,40,10,2.6,0,10,3.7,8,7.8,2,40,12.5],
// 5 24 -2.6 40 10 -2.6 0 10 -3.7 8 7.8 -2 40 12.5
  [5,24,-2.6,40,10,-2.6,0,10,-3.7,8,7.8,-2,40,12.5],
// 5 24 -3.7 8 7.8 -3.7 0 7.8 -6.3256 8 4.1965 -2.6 0 10
  [5,24,-3.7,8,7.8,-3.7,0,7.8,-6.3256,8,4.1965,-2.6,0,10],
// 5 24 3.7 0 7.8 3.7 8 7.8 6.3256 0 4.1965 2.6 0 10
  [5,24,3.7,0,7.8,3.7,8,7.8,6.3256,0,4.1965,2.6,0,10],
// 5 24 -3.7 40 7.8 -3.7 32 7.8 -2.6 40 10 -6.3256 40 4.1965
  [5,24,-3.7,40,7.8,-3.7,32,7.8,-2.6,40,10,-6.3256,40,4.1965],
// 5 24 6.3256 32 4.1965 6.3256 40 4.1965 3.7 32 7.8 7.46125 32 1.53715
  [5,24,6.3256,32,4.1965,6.3256,40,4.1965,3.7,32,7.8,7.46125,32,1.53715],
// 5 24 6.3256 0 4.1965 6.3256 8 4.1965 3.7 0 7.8 7.46125 0 1.53715
  [5,24,6.3256,0,4.1965,6.3256,8,4.1965,3.7,0,7.8,7.46125,0,1.53715],
// 5 24 -6.3256 40 4.1965 -6.3256 32 4.1965 -3.7 32 7.8 -7.46125 32 1.53715
  [5,24,-6.3256,40,4.1965,-6.3256,32,4.1965,-3.7,32,7.8,-7.46125,32,1.53715],
// 5 24 -6.3256 8 4.1965 -6.3256 0 4.1965 -3.7 0 7.8 -7.46125 0 1.53715
  [5,24,-6.3256,8,4.1965,-6.3256,0,4.1965,-3.7,0,7.8,-7.46125,0,1.53715],
];
module ldraw_lib__s__80324s02(step=0, col=false, unit=2/5, alt=false, line=0.2, solid=!$preview)
    makepoly(ldraw_lib__s__80324s02(), step=step, col=col, unit=unit, alt=alt, line=line, solid=solid);
ldraw_lib__s__80324s02(line=0.2);
// file: ../p/rect3.scad
use <../lib.scad>
function ldraw_lib__rect3() = [
// 0 Rectangle with 3 Edges
// 0 Name: rect3.dat
// 0 Author: Mark Kennedy [mkennedy]
// 0 !LDRAW_ORG Primitive UPDATE 2010-01
// 0 !LICENSE Licensed under CC BY 4.0 : see CAreadme.txt
// 
// 0 BFC CERTIFY CCW
  [0,"BFC","CERTIFY"],
  [0,"BFC","CCW"],
// 
// 0 !HISTORY 2003-08-01 [PTadmin] Official Update 2003-02
// 0 !HISTORY 2007-06-24 [PTadmin] Header formatted for Contributor Agreement
// 0 !HISTORY 2008-07-01 [PTadmin] Official Update 2008-01
// 0 !HISTORY 2010-01-17 [mikeheide] Change winding to CCW
// 0 !HISTORY 2010-04-05 [PTadmin] Official Update 2010-01
// 
// 
// 2 24 1 0 1 -1 0 1
  [2,24,1,0,1,-1,0,1],
// 2 24 1 0 1 1 0 -1
  [2,24,1,0,1,1,0,-1],
// 2 24 -1 0 1 -1 0 -1
  [2,24,-1,0,1,-1,0,-1],
// 4 16 -1 0 1 -1 0 -1 1 0 -1 1 0 1
  [4,16,-1,0,1,-1,0,-1,1,0,-1,1,0,1],
// 0 //
];
module ldraw_lib__rect3(step=0, col=false, unit=2/5, alt=false, line=0.2, solid=!$preview)
    makepoly(ldraw_lib__rect3(), step=step, col=col, unit=unit, alt=alt, line=line, solid=solid);
ldraw_lib__rect3(line=0.2);
// file: s/80324s01.scad
use <../../lib.scad>
use <../../p/rect3.scad>
use <80324s02.scad>
function ldraw_lib__s__80324s01() = [
// 0 ~Flag  2 x  2 Trapezoid with Flared Edge without Faces
// 0 Name: s\80324s01.dat
// 0 Author: Philippe Hurbain [Philo]
// 0 !LDRAW_ORG Subpart UPDATE 2024-04
// 0 !LICENSE Licensed under CC BY 4.0 : see CAreadme.txt
// 
// 0 BFC CERTIFY CCW
  [0,"BFC","CERTIFY"],
  [0,"BFC","CCW"],
// 
// 0 !HISTORY 2022-07-22 [Cheenzo] Subfiled common part with 80326
// 0 !HISTORY 2024-05-28 [OrionP] Official Update 2024-04
// 
// 
// 1 16 0 0 0 1 0 0 0 1 0 0 0 1 s\80324s02.dat
  [1,16,0,0,0,1,0,0,0,1,0,0,0,1, ldraw_lib__s__80324s02()],
// 
// 4 16 2 40 12.5 2 1.25 12.5 2.6 0 10 2.6 40 10
  [4,16,2,40,12.5,2,1.25,12.5,2.6,0,10,2.6,40,10],
// 4 16 2.6 0 10 2 1.25 12.5 -2 1.25 12.5 -2.6 0 10
  [4,16,2.6,0,10,2,1.25,12.5,-2,1.25,12.5,-2.6,0,10],
// 4 16 -2.6 0 10 -2 1.25 12.5 -2 40 12.5 -2.6 40 10
  [4,16,-2.6,0,10,-2,1.25,12.5,-2,40,12.5,-2.6,40,10],
// 1 16 0 10.625 31.25 2 0 0 0 1 9.375 0 0 18.75 rect3.dat
  [1,16,0,10.625,31.25,2,0,0,0,1,9.375,0,0,18.75, ldraw_lib__rect3()],
// 1 16 0 30 50 2 0 0 0 0 10 0 -1 0 rect3.dat
  [1,16,0,30,50,2,0,0,0,0,10,0,-1,0, ldraw_lib__rect3()],
// 2 24 2.6 0 10 -2.6 0 10
  [2,24,2.6,0,10,-2.6,0,10],
// 2 24 2.6 0 10 2 1.25 12.5
  [2,24,2.6,0,10,2,1.25,12.5],
// 2 24 -2.6 0 10 -2 1.25 12.5
  [2,24,-2.6,0,10,-2,1.25,12.5],
// 5 24 -2 40 12.5 -2 1.25 12.5 -2.6 40 10 -2 20 50
  [5,24,-2,40,12.5,-2,1.25,12.5,-2.6,40,10,-2,20,50],
// 5 24 2 1.25 12.5 2 40 12.5 2.6 0 10 2 40 50
  [5,24,2,1.25,12.5,2,40,12.5,2.6,0,10,2,40,50],
];
module ldraw_lib__s__80324s01(step=0, col=false, unit=2/5, alt=false, line=0.2, solid=!$preview)
    makepoly(ldraw_lib__s__80324s01(), step=step, col=col, unit=unit, alt=alt, line=line, solid=solid);
ldraw_lib__s__80324s01(line=0.2);
// main file
use <../lib.scad>
use <s/80324s01.scad>
function ldraw_lib__80324() = [
// 0 Flag  2 x  2 Trapezoid with Flared Edge
// 0 Name: 80324.dat
// 0 Author: Philippe Hurbain [Philo]
// 0 !LDRAW_ORG Part UPDATE 2024-04
// 0 !LICENSE Licensed under CC BY 4.0 : see CAreadme.txt
// 
// 0 BFC CERTIFY CCW
  [0,"BFC","CERTIFY"],
  [0,"BFC","CCW"],
// 
// 0 !HISTORY 2024-05-28 [OrionP] Official Update 2024-04
// 
// 
// 4 16 2 40 12.5 2 40 50 2 20 50 2 1.25 12.5
  [4,16,2,40,12.5,2,40,50,2,20,50,2,1.25,12.5],
// 4 16 -2 20 50 -2 40 50 -2 40 12.5 -2 1.25 12.5
  [4,16,-2,20,50,-2,40,50,-2,40,12.5,-2,1.25,12.5],
// 1 16 0 0 0 1 0 0 0 1 0 0 0 1 s\80324s01.dat
  [1,16,0,0,0,1,0,0,0,1,0,0,0,1, ldraw_lib__s__80324s01()],
];
module ldraw_lib__80324(step=0, col=false, unit=2/5, alt=false, line=0.2, solid=!$preview)
    makepoly(ldraw_lib__80324(), step=step, col=col, unit=unit, alt=alt, line=line, solid=solid);
ldraw_lib__80324(line=0.2);
